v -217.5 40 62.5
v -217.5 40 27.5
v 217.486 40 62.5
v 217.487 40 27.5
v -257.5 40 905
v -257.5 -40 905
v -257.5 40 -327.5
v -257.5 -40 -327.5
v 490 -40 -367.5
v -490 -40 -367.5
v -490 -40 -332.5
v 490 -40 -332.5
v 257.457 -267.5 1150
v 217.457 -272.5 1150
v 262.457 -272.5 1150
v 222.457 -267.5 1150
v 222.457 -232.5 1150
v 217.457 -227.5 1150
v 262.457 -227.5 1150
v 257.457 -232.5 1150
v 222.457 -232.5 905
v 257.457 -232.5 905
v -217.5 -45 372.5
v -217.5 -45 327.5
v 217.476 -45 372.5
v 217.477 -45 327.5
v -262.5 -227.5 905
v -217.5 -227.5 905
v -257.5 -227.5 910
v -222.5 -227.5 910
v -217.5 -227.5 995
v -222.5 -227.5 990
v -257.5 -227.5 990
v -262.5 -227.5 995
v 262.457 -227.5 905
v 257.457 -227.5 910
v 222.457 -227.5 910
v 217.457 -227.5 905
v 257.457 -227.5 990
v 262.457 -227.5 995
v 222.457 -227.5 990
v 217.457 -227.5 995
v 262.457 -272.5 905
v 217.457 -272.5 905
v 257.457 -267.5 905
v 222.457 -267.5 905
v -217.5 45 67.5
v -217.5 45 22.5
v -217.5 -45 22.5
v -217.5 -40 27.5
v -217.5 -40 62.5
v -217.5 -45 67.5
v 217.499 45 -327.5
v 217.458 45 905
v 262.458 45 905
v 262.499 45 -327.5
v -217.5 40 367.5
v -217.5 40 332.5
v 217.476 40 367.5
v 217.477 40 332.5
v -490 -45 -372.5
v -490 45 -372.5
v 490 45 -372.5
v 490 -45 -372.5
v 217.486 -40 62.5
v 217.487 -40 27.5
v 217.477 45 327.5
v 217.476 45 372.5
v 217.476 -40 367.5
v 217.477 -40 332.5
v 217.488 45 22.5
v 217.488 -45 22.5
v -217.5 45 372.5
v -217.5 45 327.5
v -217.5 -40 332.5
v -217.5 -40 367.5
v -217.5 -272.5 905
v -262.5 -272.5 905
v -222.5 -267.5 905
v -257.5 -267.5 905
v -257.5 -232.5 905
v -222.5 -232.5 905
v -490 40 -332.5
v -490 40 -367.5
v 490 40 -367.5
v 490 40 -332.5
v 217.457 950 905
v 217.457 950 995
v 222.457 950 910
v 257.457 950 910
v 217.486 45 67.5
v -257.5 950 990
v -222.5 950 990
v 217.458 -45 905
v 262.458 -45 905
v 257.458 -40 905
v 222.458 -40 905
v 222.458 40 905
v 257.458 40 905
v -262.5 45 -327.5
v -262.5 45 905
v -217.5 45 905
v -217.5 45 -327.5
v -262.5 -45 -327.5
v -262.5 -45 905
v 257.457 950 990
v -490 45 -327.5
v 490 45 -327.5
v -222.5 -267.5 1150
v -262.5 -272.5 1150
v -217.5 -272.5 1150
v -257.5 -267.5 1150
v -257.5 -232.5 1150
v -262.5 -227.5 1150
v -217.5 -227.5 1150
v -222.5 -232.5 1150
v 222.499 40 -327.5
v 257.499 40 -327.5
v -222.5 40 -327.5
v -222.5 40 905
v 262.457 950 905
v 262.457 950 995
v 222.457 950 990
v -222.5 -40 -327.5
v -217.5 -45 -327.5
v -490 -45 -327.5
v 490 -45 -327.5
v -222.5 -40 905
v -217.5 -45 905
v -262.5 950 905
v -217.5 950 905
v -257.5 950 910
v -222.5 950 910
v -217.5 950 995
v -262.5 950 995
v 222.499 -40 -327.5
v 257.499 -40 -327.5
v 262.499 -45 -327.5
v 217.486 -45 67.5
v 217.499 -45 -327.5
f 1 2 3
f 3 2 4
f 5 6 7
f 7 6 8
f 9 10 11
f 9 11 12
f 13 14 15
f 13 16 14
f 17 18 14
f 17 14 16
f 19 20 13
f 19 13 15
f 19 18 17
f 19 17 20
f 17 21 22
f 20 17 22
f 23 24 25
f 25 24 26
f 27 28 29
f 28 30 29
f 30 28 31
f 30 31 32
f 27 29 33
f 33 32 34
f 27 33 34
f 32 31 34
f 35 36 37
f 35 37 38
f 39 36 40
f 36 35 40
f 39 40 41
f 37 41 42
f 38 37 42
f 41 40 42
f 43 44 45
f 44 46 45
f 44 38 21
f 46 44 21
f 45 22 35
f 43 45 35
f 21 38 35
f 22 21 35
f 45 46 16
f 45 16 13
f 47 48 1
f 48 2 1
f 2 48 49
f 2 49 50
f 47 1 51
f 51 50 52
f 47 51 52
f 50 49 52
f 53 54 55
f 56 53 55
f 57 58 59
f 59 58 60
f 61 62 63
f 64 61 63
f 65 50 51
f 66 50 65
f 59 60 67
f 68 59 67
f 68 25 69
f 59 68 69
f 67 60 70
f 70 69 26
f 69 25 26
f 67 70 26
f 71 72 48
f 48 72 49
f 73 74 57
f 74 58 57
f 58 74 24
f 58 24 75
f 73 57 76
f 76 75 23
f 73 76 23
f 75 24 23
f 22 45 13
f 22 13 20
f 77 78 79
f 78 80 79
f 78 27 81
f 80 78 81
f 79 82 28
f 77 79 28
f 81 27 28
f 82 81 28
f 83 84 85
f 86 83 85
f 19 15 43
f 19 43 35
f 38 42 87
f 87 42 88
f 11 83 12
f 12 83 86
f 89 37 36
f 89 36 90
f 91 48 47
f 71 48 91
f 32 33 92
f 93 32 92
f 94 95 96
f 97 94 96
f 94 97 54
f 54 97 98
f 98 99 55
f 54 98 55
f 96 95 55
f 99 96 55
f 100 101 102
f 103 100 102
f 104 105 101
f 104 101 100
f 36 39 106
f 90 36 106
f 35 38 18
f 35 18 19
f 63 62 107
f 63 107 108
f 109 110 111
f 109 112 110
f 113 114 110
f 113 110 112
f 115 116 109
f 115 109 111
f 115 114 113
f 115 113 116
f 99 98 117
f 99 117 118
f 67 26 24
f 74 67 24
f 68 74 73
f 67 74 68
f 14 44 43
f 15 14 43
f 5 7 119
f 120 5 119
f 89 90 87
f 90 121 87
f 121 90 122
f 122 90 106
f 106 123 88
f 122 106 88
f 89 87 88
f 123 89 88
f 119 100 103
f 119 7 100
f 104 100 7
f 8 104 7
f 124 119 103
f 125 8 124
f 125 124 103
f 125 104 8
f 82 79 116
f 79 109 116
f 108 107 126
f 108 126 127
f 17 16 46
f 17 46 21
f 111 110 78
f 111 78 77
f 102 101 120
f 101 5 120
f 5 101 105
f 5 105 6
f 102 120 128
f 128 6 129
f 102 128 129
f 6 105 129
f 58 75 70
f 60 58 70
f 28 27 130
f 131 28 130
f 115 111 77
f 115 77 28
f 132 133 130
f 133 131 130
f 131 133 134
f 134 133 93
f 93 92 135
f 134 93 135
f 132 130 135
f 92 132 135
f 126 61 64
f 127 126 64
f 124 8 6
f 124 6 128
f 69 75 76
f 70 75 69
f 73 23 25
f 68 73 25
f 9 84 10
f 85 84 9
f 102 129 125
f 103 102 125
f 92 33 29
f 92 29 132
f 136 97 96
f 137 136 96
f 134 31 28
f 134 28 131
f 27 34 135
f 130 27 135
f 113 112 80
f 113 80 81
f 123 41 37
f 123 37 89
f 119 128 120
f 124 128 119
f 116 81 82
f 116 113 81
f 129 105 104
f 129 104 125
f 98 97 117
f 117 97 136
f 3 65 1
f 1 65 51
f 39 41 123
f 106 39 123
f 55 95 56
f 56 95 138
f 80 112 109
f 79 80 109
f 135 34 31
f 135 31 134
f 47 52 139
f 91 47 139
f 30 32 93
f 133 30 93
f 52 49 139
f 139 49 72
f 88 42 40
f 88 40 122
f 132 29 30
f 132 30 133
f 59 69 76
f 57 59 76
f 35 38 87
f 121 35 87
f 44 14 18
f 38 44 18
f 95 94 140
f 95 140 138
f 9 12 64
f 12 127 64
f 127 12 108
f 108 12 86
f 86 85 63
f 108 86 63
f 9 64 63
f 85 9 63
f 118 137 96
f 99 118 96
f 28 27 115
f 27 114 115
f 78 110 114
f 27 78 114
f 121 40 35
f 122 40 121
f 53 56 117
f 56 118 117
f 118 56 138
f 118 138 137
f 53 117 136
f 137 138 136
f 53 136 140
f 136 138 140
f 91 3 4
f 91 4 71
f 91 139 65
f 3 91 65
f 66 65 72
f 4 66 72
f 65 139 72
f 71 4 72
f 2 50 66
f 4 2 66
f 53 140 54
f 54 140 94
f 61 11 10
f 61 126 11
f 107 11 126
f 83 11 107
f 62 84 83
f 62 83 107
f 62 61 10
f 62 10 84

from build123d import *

# Parameters (mm, degrees)
SIGPROFILE_START                    = -45
SIGPROFILE_SIGMA9045_1_DEPTH        = 90
SIGPROFILE_SIGMA9045_1_2_DEPTH      = 5
SIGPROFILE_START_2                  = 40
SIGPROFILE_SIGMA9045_1_3_DEPTH      = 5
SIGPROFILE_SIGMA9045_1_4_DEPTH      = 90
SIGPROFILE_SIGMA9045_1_5_DEPTH      = 5
SIGPROFILE_SIGMA9045_1_6_DEPTH      = 5
SIGPROFILE_SIGMA9045_1_7_OUTLINE_W  = 5
SIGPROFILE_SIGMA9045_1_7_OUTLINE_H  = 1232.5
SIGPROFILE_SIGMA9045_1_7_DEPTH      = 90
SIGPROFILE_SIGMA9045_1_8_OUTLINE_W  = 35
SIGPROFILE_SIGMA9045_1_8_OUTLINE_H  = 1232.5
SIGPROFILE_SIGMA9045_1_8_DEPTH      = 5
SIGPROFILE_SIGMA9045_1_9_OUTLINE_W  = 35
SIGPROFILE_SIGMA9045_1_9_OUTLINE_H  = 1232.5
SIGPROFILE_SIGMA9045_1_9_DEPTH      = 5
SIGPROFILE_START_3                  = -372.5
SIGPROFILE_SIGMA9045_1_10_OUTLINE_W = 980
SIGPROFILE_SIGMA9045_1_10_OUTLINE_H = 90
SIGPROFILE_SIGMA9045_1_10_DEPTH     = 5
SIGPROFILE_START_4                  = -332.5
SIGPROFILE_SIGMA9045_1_11_OUTLINE_W = 980
SIGPROFILE_SIGMA9045_1_11_OUTLINE_H = 90
SIGPROFILE_SIGMA9045_1_11_DEPTH     = 5
SIGPROFILE_START_5                  = -367.5
SIGPROFILE_SIGMA9045_1_12_OUTLINE_W = 980
SIGPROFILE_SIGMA9045_1_12_OUTLINE_H = 5
SIGPROFILE_SIGMA9045_1_12_DEPTH     = 35
SIGPROFILE_START_6                  = 217.45670792
SIGPROFILE_SIGMA9045_1_13_OUTLINE_W = 1200
SIGPROFILE_SIGMA9045_1_13_OUTLINE_H = 90
SIGPROFILE_SIGMA9045_1_13_DEPTH     = 5
SIGPROFILE_START_7                  = 257.45670792
SIGPROFILE_SIGMA9045_1_14_OUTLINE_W = 1200
SIGPROFILE_SIGMA9045_1_14_OUTLINE_H = 90
SIGPROFILE_SIGMA9045_1_14_DEPTH     = 5
SIGPROFILE_START_8                  = 222.45670792
SIGPROFILE_SIGMA9045_1_15_OUTLINE_W = 1200
SIGPROFILE_SIGMA9045_1_15_OUTLINE_H = 5
SIGPROFILE_SIGMA9045_1_15_DEPTH     = 35
SIGPROFILE_START_9                  = -262.5
SIGPROFILE_SIGMA9045_1_16_OUTLINE_W = 1200
SIGPROFILE_SIGMA9045_1_16_OUTLINE_H = 90
SIGPROFILE_SIGMA9045_1_16_DEPTH     = 5
SIGPROFILE_START_10                 = -222.5
SIGPROFILE_SIGMA9045_1_17_OUTLINE_W = 1200
SIGPROFILE_SIGMA9045_1_17_OUTLINE_H = 90
SIGPROFILE_SIGMA9045_1_17_DEPTH     = 5
SIGPROFILE_START_11                 = -257.5
SIGPROFILE_SIGMA9045_1_18_OUTLINE_W = 1200
SIGPROFILE_SIGMA9045_1_18_OUTLINE_H = 5
SIGPROFILE_SIGMA9045_1_18_DEPTH     = 35
SIGPROFILE_SIGMA9045_1_19_DEPTH     = 90
SIGPROFILE_SIGMA9045_1_20_DEPTH     = 5
SIGPROFILE_SIGMA9045_1_21_DEPTH     = 5
SKETCH11_W                          = 45
SKETCH11_H                          = 45
SKETCH11_W_2                        = 35
SKETCH11_H_2                        = 35
SIGPROFILE_SIGMA4545LIGHT_1_DEPTH   = 200
SKETCH11_ON_SEGMENT_2_W             = 45
SKETCH11_ON_SEGMENT_2_H             = 45
SKETCH11_ON_SEGMENT_2_W_2           = 35
SKETCH11_ON_SEGMENT_2_H_2           = 35
SIGPROFILE_SIGMA4545LIGHT_1_2_DEPTH = 200
BODY_8_RUN_ON_DEPTH                 = 45
BODY_9_RUN_ON_DEPTH                 = 44.999999


# Read off the part's stored shape, not the designer's step: Sigprofile SIGMA9045(1)
with BuildPart() as part:
    # Sigprofile SIGMA9045(1) outline → Sigprofile SIGMA9045(1) (new body)
    with BuildSketch(Plane(origin=(0, 0, 0), x_dir=(1, 0, 0), z_dir=(0, 1, 0)).offset(SIGPROFILE_START)):
        Polygon((217.477438166, -327.5), (-217.5, -327.5), (-217.5, -332.5), (217.477271658, -332.5), align=None)
        Polygon((217.476106102, -367.5), (-217.5, -367.5), (-217.5, -372.5), (217.475939594, -372.5), align=None)
    extrude(amount=SIGPROFILE_SIGMA9045_1_DEPTH)

    # Sigprofile SIGMA9045_1 2 outline → Sigprofile SIGMA9045_1 2 (add)
    with BuildSketch(Plane(origin=(0, 0, 0), x_dir=(1, 0, 0), z_dir=(0, 1, 0)).offset(SIGPROFILE_START)):
        Polygon((217.477271658, -332.5), (-217.5, -332.5), (-217.5, -367.5), (217.476106102, -367.5), align=None)
    extrude(amount=SIGPROFILE_SIGMA9045_1_2_DEPTH)

    # Sigprofile SIGMA9045_1 3 outline → Sigprofile SIGMA9045_1 3 (add)
    with BuildSketch(Plane(origin=(0, 0, 0), x_dir=(1, 0, 0), z_dir=(0, 1, 0)).offset(SIGPROFILE_START_2)):
        Polygon((217.477271658, -332.5), (-217.5, -332.5), (-217.5, -367.5), (217.476106102, -367.5), align=None)
    extrude(amount=SIGPROFILE_SIGMA9045_1_3_DEPTH)


with BuildPart() as body_2:
    # Sigprofile SIGMA9045_1 4 outline → Sigprofile SIGMA9045_1 4 (new body)
    with BuildSketch(Plane(origin=(0, 0, 0), x_dir=(1, 0, 0), z_dir=(0, 1, 0)).offset(SIGPROFILE_START)):
        Polygon((217.486096582, -67.5), (217.48626309, -62.5), (-217.5, -62.5), (-217.5, -67.5), align=None)
        Polygon((-217.5, -27.5), (217.487428646, -27.5), (217.487595154, -22.5), (-217.5, -22.5), align=None)
    extrude(amount=SIGPROFILE_SIGMA9045_1_4_DEPTH)

    # Sigprofile SIGMA9045_1 5 outline → Sigprofile SIGMA9045_1 5 (add)
    with BuildSketch(Plane(origin=(0, 0, 0), x_dir=(1, 0, 0), z_dir=(0, 1, 0)).offset(SIGPROFILE_START)):
        Polygon((-217.5, -62.5), (217.48626309, -62.5), (217.487428646, -27.5), (-217.5, -27.5), align=None)
    extrude(amount=SIGPROFILE_SIGMA9045_1_5_DEPTH)

    # Sigprofile SIGMA9045_1 6 outline → Sigprofile SIGMA9045_1 6 (add)
    with BuildSketch(Plane(origin=(0, 0, 0), x_dir=(1, 0, 0), z_dir=(0, 1, 0)).offset(SIGPROFILE_START_2)):
        Polygon((-217.5, -62.5), (217.48626309, -62.5), (217.487428646, -27.5), (-217.5, -27.5), align=None)
    extrude(amount=SIGPROFILE_SIGMA9045_1_6_DEPTH)


with BuildPart() as body_3:
    # Sigprofile SIGMA9045_1 7 outline → Sigprofile SIGMA9045_1 7 (new body)
    with BuildSketch(Plane(origin=(0, 0, 0), x_dir=(1, 0, 0), z_dir=(0, 1, 0)).offset(SIGPROFILE_START)):
        with Locations((-220, -288.75)):
            Rectangle(SIGPROFILE_SIGMA9045_1_7_OUTLINE_W, SIGPROFILE_SIGMA9045_1_7_OUTLINE_H)
        with Locations((-260, -288.75)):
            Rectangle(SIGPROFILE_SIGMA9045_1_7_OUTLINE_W, SIGPROFILE_SIGMA9045_1_7_OUTLINE_H)
    extrude(amount=SIGPROFILE_SIGMA9045_1_7_DEPTH)

    # Sigprofile SIGMA9045_1 8 outline → Sigprofile SIGMA9045_1 8 (add)
    with BuildSketch(Plane(origin=(0, 0, 0), x_dir=(1, 0, 0), z_dir=(0, 1, 0)).offset(SIGPROFILE_START)):
        with Locations((-240, -288.75)):
            Rectangle(SIGPROFILE_SIGMA9045_1_8_OUTLINE_W, SIGPROFILE_SIGMA9045_1_8_OUTLINE_H)
    extrude(amount=SIGPROFILE_SIGMA9045_1_8_DEPTH)

    # Sigprofile SIGMA9045_1 9 outline → Sigprofile SIGMA9045_1 9 (add)
    with BuildSketch(Plane(origin=(0, 0, 0), x_dir=(1, 0, 0), z_dir=(0, 1, 0)).offset(SIGPROFILE_START_2)):
        with Locations((-240, -288.75)):
            Rectangle(SIGPROFILE_SIGMA9045_1_9_OUTLINE_W, SIGPROFILE_SIGMA9045_1_9_OUTLINE_H)
    extrude(amount=SIGPROFILE_SIGMA9045_1_9_DEPTH)


with BuildPart() as body_4:
    # Sigprofile SIGMA9045_1 10 outline → Sigprofile SIGMA9045_1 10 (new body)
    with BuildSketch(Plane.XY.offset(SIGPROFILE_START_3)):
        Rectangle(SIGPROFILE_SIGMA9045_1_10_OUTLINE_W, SIGPROFILE_SIGMA9045_1_10_OUTLINE_H)
    extrude(amount=SIGPROFILE_SIGMA9045_1_10_DEPTH)

    # Sigprofile SIGMA9045_1 11 outline → Sigprofile SIGMA9045_1 11 (add)
    with BuildSketch(Plane.XY.offset(SIGPROFILE_START_4)):
        Rectangle(SIGPROFILE_SIGMA9045_1_11_OUTLINE_W, SIGPROFILE_SIGMA9045_1_11_OUTLINE_H)
    extrude(amount=SIGPROFILE_SIGMA9045_1_11_DEPTH)

    # Sigprofile SIGMA9045_1 12 outline → Sigprofile SIGMA9045_1 12 (add)
    with BuildSketch(Plane.XY.offset(SIGPROFILE_START_5)):
        with Locations((0, 42.5)):
            Rectangle(SIGPROFILE_SIGMA9045_1_12_OUTLINE_W, SIGPROFILE_SIGMA9045_1_12_OUTLINE_H)
        with Locations((0, -42.5)):
            Rectangle(SIGPROFILE_SIGMA9045_1_12_OUTLINE_W, SIGPROFILE_SIGMA9045_1_12_OUTLINE_H)
    extrude(amount=SIGPROFILE_SIGMA9045_1_12_DEPTH)


with BuildPart() as body_5:
    # Sigprofile SIGMA9045_1 13 outline → Sigprofile SIGMA9045_1 13 (new body)
    with BuildSketch(Plane.YZ.offset(SIGPROFILE_START_6)):
        with Locations((350.000005857, 949.999999279)):
            Rectangle(SIGPROFILE_SIGMA9045_1_13_OUTLINE_W, SIGPROFILE_SIGMA9045_1_13_OUTLINE_H)
    extrude(amount=SIGPROFILE_SIGMA9045_1_13_DEPTH)

    # Sigprofile SIGMA9045_1 14 outline → Sigprofile SIGMA9045_1 14 (add)
    with BuildSketch(Plane.YZ.offset(SIGPROFILE_START_7)):
        with Locations((350.000005857, 949.999999279)):
            Rectangle(SIGPROFILE_SIGMA9045_1_14_OUTLINE_W, SIGPROFILE_SIGMA9045_1_14_OUTLINE_H)
    extrude(amount=SIGPROFILE_SIGMA9045_1_14_DEPTH)

    # Sigprofile SIGMA9045_1 15 outline → Sigprofile SIGMA9045_1 15 (add)
    with BuildSketch(Plane.YZ.offset(SIGPROFILE_START_8)):
        with Locations((350.000005857, 907.499999279)):
            Rectangle(SIGPROFILE_SIGMA9045_1_15_OUTLINE_W, SIGPROFILE_SIGMA9045_1_15_OUTLINE_H)
        with Locations((350.000005857, 992.499999279)):
            Rectangle(SIGPROFILE_SIGMA9045_1_15_OUTLINE_W, SIGPROFILE_SIGMA9045_1_15_OUTLINE_H)
    extrude(amount=SIGPROFILE_SIGMA9045_1_15_DEPTH)

    # Trim/Extend3
    split(bisect_by=Plane(origin=(-240, -227.5, 1050), x_dir=(-1, 0, 0), z_dir=(0, 1, 0)), keep=Keep.TOP)


with BuildPart() as body_6:
    # Sigprofile SIGMA9045_1 16 outline → Sigprofile SIGMA9045_1 16 (new body)
    with BuildSketch(Plane.YZ.offset(SIGPROFILE_START_9)):
        with Locations((350, 950)):
            Rectangle(SIGPROFILE_SIGMA9045_1_16_OUTLINE_W, SIGPROFILE_SIGMA9045_1_16_OUTLINE_H)
    extrude(amount=SIGPROFILE_SIGMA9045_1_16_DEPTH)

    # Sigprofile SIGMA9045_1 17 outline → Sigprofile SIGMA9045_1 17 (add)
    with BuildSketch(Plane.YZ.offset(SIGPROFILE_START_10)):
        with Locations((350, 950)):
            Rectangle(SIGPROFILE_SIGMA9045_1_17_OUTLINE_W, SIGPROFILE_SIGMA9045_1_17_OUTLINE_H)
    extrude(amount=SIGPROFILE_SIGMA9045_1_17_DEPTH)

    # Sigprofile SIGMA9045_1 18 outline → Sigprofile SIGMA9045_1 18 (add)
    with BuildSketch(Plane.YZ.offset(SIGPROFILE_START_11)):
        with Locations((350, 907.5)):
            Rectangle(SIGPROFILE_SIGMA9045_1_18_OUTLINE_W, SIGPROFILE_SIGMA9045_1_18_OUTLINE_H)
        with Locations((350, 992.5)):
            Rectangle(SIGPROFILE_SIGMA9045_1_18_OUTLINE_W, SIGPROFILE_SIGMA9045_1_18_OUTLINE_H)
    extrude(amount=SIGPROFILE_SIGMA9045_1_18_DEPTH)

    # Trim/Extend3
    split(bisect_by=Plane(origin=(-240, -227.5, 1050), x_dir=(-1, 0, 0), z_dir=(0, 1, 0)), keep=Keep.TOP)


with BuildPart() as body_7:
    # Sigprofile SIGMA9045_1 19 outline → Sigprofile SIGMA9045_1 19 (new body)
    with BuildSketch(Plane(origin=(0, 0, 0), x_dir=(1, 0, 0), z_dir=(0, 1, 0)).offset(SIGPROFILE_START)):
        Polygon((217.455209348, -994.999999279), (222.455209348, -994.999999279), (222.499250714, 327.5), (217.499250714, 327.5), align=None)
        Polygon((257.499250714, 327.5), (257.455209348, -994.999999279), (262.455209348, -994.999999279), (262.499250714, 327.5), align=None)
    extrude(amount=SIGPROFILE_SIGMA9045_1_19_DEPTH)

    # Sigprofile SIGMA9045_1 20 outline → Sigprofile SIGMA9045_1 20 (add)
    with BuildSketch(Plane(origin=(0, 0, 0), x_dir=(1, 0, 0), z_dir=(0, 1, 0)).offset(SIGPROFILE_START)):
        Polygon((222.499250714, 327.5), (222.455209348, -994.999999279), (257.455209348, -994.999999279), (257.499250714, 327.5), align=None)
    extrude(amount=SIGPROFILE_SIGMA9045_1_20_DEPTH)

    # Sigprofile SIGMA9045_1 21 outline → Sigprofile SIGMA9045_1 21 (add)
    with BuildSketch(Plane(origin=(0, 0, 0), x_dir=(1, 0, 0), z_dir=(0, 1, 0)).offset(SIGPROFILE_START_2)):
        Polygon((222.499250714, 327.5), (222.455209348, -994.999999279), (257.455209348, -994.999999279), (257.499250714, 327.5), align=None)
    extrude(amount=SIGPROFILE_SIGMA9045_1_21_DEPTH)

    # Trim/Extend2
    split(bisect_by=Plane(origin=(-240, 350, 905), x_dir=(0, 1, 0), z_dir=(0, 0, -1)), keep=Keep.TOP)


with BuildPart() as body_8:
    # Sketch11 → Sigprofile SIGMA4545LIGHT(1) (new body)
    with BuildSketch(Plane(origin=(-240, -250, 950), x_dir=(1, 0, 0), z_dir=(0, 0, 1))):
        Rectangle(SKETCH11_W, SKETCH11_H)
        Rectangle(SKETCH11_W_2, SKETCH11_H_2, mode=Mode.SUBTRACT)
    extrude(amount=SIGPROFILE_SIGMA4545LIGHT_1_DEPTH)

    # Sketch11 → body 8 run on (add)
    with BuildSketch(Plane(origin=(-240, -250, 950), x_dir=(1, 0, 0), z_dir=(0, 0, 1))):
        Rectangle(SKETCH11_W, SKETCH11_H)
        Rectangle(SKETCH11_W_2, SKETCH11_H_2, mode=Mode.SUBTRACT)
    extrude(amount=-BODY_8_RUN_ON_DEPTH)


with BuildPart() as body_9:
    # Sketch11 on segment 2 (carried to segment 2) → Sigprofile SIGMA4545LIGHT_1 2 (new body)
    with BuildSketch(Plane(origin=(239.95670792, -249.999994143, 949.999999279), x_dir=(1, 0, 0), z_dir=(0, 0, 1))):
        Rectangle(SKETCH11_ON_SEGMENT_2_W, SKETCH11_ON_SEGMENT_2_H)
        Rectangle(SKETCH11_ON_SEGMENT_2_W_2, SKETCH11_ON_SEGMENT_2_H_2, mode=Mode.SUBTRACT)
    extrude(amount=SIGPROFILE_SIGMA4545LIGHT_1_2_DEPTH)

    # Sketch11 on segment 2 (carried to segment 2) → body 9 run on (add)
    with BuildSketch(Plane(origin=(239.95670792, -249.999994143, 949.999999279), x_dir=(1, 0, 0), z_dir=(0, 0, 1))):
        Rectangle(SKETCH11_ON_SEGMENT_2_W, SKETCH11_ON_SEGMENT_2_H)
        Rectangle(SKETCH11_ON_SEGMENT_2_W_2, SKETCH11_ON_SEGMENT_2_H_2, mode=Mode.SUBTRACT)
    extrude(amount=-BODY_9_RUN_ON_DEPTH)


solid = Compound([part.part, body_2.part, body_3.part, body_4.part, body_5.part, body_6.part, body_7.part, body_8.part, body_9.part])
